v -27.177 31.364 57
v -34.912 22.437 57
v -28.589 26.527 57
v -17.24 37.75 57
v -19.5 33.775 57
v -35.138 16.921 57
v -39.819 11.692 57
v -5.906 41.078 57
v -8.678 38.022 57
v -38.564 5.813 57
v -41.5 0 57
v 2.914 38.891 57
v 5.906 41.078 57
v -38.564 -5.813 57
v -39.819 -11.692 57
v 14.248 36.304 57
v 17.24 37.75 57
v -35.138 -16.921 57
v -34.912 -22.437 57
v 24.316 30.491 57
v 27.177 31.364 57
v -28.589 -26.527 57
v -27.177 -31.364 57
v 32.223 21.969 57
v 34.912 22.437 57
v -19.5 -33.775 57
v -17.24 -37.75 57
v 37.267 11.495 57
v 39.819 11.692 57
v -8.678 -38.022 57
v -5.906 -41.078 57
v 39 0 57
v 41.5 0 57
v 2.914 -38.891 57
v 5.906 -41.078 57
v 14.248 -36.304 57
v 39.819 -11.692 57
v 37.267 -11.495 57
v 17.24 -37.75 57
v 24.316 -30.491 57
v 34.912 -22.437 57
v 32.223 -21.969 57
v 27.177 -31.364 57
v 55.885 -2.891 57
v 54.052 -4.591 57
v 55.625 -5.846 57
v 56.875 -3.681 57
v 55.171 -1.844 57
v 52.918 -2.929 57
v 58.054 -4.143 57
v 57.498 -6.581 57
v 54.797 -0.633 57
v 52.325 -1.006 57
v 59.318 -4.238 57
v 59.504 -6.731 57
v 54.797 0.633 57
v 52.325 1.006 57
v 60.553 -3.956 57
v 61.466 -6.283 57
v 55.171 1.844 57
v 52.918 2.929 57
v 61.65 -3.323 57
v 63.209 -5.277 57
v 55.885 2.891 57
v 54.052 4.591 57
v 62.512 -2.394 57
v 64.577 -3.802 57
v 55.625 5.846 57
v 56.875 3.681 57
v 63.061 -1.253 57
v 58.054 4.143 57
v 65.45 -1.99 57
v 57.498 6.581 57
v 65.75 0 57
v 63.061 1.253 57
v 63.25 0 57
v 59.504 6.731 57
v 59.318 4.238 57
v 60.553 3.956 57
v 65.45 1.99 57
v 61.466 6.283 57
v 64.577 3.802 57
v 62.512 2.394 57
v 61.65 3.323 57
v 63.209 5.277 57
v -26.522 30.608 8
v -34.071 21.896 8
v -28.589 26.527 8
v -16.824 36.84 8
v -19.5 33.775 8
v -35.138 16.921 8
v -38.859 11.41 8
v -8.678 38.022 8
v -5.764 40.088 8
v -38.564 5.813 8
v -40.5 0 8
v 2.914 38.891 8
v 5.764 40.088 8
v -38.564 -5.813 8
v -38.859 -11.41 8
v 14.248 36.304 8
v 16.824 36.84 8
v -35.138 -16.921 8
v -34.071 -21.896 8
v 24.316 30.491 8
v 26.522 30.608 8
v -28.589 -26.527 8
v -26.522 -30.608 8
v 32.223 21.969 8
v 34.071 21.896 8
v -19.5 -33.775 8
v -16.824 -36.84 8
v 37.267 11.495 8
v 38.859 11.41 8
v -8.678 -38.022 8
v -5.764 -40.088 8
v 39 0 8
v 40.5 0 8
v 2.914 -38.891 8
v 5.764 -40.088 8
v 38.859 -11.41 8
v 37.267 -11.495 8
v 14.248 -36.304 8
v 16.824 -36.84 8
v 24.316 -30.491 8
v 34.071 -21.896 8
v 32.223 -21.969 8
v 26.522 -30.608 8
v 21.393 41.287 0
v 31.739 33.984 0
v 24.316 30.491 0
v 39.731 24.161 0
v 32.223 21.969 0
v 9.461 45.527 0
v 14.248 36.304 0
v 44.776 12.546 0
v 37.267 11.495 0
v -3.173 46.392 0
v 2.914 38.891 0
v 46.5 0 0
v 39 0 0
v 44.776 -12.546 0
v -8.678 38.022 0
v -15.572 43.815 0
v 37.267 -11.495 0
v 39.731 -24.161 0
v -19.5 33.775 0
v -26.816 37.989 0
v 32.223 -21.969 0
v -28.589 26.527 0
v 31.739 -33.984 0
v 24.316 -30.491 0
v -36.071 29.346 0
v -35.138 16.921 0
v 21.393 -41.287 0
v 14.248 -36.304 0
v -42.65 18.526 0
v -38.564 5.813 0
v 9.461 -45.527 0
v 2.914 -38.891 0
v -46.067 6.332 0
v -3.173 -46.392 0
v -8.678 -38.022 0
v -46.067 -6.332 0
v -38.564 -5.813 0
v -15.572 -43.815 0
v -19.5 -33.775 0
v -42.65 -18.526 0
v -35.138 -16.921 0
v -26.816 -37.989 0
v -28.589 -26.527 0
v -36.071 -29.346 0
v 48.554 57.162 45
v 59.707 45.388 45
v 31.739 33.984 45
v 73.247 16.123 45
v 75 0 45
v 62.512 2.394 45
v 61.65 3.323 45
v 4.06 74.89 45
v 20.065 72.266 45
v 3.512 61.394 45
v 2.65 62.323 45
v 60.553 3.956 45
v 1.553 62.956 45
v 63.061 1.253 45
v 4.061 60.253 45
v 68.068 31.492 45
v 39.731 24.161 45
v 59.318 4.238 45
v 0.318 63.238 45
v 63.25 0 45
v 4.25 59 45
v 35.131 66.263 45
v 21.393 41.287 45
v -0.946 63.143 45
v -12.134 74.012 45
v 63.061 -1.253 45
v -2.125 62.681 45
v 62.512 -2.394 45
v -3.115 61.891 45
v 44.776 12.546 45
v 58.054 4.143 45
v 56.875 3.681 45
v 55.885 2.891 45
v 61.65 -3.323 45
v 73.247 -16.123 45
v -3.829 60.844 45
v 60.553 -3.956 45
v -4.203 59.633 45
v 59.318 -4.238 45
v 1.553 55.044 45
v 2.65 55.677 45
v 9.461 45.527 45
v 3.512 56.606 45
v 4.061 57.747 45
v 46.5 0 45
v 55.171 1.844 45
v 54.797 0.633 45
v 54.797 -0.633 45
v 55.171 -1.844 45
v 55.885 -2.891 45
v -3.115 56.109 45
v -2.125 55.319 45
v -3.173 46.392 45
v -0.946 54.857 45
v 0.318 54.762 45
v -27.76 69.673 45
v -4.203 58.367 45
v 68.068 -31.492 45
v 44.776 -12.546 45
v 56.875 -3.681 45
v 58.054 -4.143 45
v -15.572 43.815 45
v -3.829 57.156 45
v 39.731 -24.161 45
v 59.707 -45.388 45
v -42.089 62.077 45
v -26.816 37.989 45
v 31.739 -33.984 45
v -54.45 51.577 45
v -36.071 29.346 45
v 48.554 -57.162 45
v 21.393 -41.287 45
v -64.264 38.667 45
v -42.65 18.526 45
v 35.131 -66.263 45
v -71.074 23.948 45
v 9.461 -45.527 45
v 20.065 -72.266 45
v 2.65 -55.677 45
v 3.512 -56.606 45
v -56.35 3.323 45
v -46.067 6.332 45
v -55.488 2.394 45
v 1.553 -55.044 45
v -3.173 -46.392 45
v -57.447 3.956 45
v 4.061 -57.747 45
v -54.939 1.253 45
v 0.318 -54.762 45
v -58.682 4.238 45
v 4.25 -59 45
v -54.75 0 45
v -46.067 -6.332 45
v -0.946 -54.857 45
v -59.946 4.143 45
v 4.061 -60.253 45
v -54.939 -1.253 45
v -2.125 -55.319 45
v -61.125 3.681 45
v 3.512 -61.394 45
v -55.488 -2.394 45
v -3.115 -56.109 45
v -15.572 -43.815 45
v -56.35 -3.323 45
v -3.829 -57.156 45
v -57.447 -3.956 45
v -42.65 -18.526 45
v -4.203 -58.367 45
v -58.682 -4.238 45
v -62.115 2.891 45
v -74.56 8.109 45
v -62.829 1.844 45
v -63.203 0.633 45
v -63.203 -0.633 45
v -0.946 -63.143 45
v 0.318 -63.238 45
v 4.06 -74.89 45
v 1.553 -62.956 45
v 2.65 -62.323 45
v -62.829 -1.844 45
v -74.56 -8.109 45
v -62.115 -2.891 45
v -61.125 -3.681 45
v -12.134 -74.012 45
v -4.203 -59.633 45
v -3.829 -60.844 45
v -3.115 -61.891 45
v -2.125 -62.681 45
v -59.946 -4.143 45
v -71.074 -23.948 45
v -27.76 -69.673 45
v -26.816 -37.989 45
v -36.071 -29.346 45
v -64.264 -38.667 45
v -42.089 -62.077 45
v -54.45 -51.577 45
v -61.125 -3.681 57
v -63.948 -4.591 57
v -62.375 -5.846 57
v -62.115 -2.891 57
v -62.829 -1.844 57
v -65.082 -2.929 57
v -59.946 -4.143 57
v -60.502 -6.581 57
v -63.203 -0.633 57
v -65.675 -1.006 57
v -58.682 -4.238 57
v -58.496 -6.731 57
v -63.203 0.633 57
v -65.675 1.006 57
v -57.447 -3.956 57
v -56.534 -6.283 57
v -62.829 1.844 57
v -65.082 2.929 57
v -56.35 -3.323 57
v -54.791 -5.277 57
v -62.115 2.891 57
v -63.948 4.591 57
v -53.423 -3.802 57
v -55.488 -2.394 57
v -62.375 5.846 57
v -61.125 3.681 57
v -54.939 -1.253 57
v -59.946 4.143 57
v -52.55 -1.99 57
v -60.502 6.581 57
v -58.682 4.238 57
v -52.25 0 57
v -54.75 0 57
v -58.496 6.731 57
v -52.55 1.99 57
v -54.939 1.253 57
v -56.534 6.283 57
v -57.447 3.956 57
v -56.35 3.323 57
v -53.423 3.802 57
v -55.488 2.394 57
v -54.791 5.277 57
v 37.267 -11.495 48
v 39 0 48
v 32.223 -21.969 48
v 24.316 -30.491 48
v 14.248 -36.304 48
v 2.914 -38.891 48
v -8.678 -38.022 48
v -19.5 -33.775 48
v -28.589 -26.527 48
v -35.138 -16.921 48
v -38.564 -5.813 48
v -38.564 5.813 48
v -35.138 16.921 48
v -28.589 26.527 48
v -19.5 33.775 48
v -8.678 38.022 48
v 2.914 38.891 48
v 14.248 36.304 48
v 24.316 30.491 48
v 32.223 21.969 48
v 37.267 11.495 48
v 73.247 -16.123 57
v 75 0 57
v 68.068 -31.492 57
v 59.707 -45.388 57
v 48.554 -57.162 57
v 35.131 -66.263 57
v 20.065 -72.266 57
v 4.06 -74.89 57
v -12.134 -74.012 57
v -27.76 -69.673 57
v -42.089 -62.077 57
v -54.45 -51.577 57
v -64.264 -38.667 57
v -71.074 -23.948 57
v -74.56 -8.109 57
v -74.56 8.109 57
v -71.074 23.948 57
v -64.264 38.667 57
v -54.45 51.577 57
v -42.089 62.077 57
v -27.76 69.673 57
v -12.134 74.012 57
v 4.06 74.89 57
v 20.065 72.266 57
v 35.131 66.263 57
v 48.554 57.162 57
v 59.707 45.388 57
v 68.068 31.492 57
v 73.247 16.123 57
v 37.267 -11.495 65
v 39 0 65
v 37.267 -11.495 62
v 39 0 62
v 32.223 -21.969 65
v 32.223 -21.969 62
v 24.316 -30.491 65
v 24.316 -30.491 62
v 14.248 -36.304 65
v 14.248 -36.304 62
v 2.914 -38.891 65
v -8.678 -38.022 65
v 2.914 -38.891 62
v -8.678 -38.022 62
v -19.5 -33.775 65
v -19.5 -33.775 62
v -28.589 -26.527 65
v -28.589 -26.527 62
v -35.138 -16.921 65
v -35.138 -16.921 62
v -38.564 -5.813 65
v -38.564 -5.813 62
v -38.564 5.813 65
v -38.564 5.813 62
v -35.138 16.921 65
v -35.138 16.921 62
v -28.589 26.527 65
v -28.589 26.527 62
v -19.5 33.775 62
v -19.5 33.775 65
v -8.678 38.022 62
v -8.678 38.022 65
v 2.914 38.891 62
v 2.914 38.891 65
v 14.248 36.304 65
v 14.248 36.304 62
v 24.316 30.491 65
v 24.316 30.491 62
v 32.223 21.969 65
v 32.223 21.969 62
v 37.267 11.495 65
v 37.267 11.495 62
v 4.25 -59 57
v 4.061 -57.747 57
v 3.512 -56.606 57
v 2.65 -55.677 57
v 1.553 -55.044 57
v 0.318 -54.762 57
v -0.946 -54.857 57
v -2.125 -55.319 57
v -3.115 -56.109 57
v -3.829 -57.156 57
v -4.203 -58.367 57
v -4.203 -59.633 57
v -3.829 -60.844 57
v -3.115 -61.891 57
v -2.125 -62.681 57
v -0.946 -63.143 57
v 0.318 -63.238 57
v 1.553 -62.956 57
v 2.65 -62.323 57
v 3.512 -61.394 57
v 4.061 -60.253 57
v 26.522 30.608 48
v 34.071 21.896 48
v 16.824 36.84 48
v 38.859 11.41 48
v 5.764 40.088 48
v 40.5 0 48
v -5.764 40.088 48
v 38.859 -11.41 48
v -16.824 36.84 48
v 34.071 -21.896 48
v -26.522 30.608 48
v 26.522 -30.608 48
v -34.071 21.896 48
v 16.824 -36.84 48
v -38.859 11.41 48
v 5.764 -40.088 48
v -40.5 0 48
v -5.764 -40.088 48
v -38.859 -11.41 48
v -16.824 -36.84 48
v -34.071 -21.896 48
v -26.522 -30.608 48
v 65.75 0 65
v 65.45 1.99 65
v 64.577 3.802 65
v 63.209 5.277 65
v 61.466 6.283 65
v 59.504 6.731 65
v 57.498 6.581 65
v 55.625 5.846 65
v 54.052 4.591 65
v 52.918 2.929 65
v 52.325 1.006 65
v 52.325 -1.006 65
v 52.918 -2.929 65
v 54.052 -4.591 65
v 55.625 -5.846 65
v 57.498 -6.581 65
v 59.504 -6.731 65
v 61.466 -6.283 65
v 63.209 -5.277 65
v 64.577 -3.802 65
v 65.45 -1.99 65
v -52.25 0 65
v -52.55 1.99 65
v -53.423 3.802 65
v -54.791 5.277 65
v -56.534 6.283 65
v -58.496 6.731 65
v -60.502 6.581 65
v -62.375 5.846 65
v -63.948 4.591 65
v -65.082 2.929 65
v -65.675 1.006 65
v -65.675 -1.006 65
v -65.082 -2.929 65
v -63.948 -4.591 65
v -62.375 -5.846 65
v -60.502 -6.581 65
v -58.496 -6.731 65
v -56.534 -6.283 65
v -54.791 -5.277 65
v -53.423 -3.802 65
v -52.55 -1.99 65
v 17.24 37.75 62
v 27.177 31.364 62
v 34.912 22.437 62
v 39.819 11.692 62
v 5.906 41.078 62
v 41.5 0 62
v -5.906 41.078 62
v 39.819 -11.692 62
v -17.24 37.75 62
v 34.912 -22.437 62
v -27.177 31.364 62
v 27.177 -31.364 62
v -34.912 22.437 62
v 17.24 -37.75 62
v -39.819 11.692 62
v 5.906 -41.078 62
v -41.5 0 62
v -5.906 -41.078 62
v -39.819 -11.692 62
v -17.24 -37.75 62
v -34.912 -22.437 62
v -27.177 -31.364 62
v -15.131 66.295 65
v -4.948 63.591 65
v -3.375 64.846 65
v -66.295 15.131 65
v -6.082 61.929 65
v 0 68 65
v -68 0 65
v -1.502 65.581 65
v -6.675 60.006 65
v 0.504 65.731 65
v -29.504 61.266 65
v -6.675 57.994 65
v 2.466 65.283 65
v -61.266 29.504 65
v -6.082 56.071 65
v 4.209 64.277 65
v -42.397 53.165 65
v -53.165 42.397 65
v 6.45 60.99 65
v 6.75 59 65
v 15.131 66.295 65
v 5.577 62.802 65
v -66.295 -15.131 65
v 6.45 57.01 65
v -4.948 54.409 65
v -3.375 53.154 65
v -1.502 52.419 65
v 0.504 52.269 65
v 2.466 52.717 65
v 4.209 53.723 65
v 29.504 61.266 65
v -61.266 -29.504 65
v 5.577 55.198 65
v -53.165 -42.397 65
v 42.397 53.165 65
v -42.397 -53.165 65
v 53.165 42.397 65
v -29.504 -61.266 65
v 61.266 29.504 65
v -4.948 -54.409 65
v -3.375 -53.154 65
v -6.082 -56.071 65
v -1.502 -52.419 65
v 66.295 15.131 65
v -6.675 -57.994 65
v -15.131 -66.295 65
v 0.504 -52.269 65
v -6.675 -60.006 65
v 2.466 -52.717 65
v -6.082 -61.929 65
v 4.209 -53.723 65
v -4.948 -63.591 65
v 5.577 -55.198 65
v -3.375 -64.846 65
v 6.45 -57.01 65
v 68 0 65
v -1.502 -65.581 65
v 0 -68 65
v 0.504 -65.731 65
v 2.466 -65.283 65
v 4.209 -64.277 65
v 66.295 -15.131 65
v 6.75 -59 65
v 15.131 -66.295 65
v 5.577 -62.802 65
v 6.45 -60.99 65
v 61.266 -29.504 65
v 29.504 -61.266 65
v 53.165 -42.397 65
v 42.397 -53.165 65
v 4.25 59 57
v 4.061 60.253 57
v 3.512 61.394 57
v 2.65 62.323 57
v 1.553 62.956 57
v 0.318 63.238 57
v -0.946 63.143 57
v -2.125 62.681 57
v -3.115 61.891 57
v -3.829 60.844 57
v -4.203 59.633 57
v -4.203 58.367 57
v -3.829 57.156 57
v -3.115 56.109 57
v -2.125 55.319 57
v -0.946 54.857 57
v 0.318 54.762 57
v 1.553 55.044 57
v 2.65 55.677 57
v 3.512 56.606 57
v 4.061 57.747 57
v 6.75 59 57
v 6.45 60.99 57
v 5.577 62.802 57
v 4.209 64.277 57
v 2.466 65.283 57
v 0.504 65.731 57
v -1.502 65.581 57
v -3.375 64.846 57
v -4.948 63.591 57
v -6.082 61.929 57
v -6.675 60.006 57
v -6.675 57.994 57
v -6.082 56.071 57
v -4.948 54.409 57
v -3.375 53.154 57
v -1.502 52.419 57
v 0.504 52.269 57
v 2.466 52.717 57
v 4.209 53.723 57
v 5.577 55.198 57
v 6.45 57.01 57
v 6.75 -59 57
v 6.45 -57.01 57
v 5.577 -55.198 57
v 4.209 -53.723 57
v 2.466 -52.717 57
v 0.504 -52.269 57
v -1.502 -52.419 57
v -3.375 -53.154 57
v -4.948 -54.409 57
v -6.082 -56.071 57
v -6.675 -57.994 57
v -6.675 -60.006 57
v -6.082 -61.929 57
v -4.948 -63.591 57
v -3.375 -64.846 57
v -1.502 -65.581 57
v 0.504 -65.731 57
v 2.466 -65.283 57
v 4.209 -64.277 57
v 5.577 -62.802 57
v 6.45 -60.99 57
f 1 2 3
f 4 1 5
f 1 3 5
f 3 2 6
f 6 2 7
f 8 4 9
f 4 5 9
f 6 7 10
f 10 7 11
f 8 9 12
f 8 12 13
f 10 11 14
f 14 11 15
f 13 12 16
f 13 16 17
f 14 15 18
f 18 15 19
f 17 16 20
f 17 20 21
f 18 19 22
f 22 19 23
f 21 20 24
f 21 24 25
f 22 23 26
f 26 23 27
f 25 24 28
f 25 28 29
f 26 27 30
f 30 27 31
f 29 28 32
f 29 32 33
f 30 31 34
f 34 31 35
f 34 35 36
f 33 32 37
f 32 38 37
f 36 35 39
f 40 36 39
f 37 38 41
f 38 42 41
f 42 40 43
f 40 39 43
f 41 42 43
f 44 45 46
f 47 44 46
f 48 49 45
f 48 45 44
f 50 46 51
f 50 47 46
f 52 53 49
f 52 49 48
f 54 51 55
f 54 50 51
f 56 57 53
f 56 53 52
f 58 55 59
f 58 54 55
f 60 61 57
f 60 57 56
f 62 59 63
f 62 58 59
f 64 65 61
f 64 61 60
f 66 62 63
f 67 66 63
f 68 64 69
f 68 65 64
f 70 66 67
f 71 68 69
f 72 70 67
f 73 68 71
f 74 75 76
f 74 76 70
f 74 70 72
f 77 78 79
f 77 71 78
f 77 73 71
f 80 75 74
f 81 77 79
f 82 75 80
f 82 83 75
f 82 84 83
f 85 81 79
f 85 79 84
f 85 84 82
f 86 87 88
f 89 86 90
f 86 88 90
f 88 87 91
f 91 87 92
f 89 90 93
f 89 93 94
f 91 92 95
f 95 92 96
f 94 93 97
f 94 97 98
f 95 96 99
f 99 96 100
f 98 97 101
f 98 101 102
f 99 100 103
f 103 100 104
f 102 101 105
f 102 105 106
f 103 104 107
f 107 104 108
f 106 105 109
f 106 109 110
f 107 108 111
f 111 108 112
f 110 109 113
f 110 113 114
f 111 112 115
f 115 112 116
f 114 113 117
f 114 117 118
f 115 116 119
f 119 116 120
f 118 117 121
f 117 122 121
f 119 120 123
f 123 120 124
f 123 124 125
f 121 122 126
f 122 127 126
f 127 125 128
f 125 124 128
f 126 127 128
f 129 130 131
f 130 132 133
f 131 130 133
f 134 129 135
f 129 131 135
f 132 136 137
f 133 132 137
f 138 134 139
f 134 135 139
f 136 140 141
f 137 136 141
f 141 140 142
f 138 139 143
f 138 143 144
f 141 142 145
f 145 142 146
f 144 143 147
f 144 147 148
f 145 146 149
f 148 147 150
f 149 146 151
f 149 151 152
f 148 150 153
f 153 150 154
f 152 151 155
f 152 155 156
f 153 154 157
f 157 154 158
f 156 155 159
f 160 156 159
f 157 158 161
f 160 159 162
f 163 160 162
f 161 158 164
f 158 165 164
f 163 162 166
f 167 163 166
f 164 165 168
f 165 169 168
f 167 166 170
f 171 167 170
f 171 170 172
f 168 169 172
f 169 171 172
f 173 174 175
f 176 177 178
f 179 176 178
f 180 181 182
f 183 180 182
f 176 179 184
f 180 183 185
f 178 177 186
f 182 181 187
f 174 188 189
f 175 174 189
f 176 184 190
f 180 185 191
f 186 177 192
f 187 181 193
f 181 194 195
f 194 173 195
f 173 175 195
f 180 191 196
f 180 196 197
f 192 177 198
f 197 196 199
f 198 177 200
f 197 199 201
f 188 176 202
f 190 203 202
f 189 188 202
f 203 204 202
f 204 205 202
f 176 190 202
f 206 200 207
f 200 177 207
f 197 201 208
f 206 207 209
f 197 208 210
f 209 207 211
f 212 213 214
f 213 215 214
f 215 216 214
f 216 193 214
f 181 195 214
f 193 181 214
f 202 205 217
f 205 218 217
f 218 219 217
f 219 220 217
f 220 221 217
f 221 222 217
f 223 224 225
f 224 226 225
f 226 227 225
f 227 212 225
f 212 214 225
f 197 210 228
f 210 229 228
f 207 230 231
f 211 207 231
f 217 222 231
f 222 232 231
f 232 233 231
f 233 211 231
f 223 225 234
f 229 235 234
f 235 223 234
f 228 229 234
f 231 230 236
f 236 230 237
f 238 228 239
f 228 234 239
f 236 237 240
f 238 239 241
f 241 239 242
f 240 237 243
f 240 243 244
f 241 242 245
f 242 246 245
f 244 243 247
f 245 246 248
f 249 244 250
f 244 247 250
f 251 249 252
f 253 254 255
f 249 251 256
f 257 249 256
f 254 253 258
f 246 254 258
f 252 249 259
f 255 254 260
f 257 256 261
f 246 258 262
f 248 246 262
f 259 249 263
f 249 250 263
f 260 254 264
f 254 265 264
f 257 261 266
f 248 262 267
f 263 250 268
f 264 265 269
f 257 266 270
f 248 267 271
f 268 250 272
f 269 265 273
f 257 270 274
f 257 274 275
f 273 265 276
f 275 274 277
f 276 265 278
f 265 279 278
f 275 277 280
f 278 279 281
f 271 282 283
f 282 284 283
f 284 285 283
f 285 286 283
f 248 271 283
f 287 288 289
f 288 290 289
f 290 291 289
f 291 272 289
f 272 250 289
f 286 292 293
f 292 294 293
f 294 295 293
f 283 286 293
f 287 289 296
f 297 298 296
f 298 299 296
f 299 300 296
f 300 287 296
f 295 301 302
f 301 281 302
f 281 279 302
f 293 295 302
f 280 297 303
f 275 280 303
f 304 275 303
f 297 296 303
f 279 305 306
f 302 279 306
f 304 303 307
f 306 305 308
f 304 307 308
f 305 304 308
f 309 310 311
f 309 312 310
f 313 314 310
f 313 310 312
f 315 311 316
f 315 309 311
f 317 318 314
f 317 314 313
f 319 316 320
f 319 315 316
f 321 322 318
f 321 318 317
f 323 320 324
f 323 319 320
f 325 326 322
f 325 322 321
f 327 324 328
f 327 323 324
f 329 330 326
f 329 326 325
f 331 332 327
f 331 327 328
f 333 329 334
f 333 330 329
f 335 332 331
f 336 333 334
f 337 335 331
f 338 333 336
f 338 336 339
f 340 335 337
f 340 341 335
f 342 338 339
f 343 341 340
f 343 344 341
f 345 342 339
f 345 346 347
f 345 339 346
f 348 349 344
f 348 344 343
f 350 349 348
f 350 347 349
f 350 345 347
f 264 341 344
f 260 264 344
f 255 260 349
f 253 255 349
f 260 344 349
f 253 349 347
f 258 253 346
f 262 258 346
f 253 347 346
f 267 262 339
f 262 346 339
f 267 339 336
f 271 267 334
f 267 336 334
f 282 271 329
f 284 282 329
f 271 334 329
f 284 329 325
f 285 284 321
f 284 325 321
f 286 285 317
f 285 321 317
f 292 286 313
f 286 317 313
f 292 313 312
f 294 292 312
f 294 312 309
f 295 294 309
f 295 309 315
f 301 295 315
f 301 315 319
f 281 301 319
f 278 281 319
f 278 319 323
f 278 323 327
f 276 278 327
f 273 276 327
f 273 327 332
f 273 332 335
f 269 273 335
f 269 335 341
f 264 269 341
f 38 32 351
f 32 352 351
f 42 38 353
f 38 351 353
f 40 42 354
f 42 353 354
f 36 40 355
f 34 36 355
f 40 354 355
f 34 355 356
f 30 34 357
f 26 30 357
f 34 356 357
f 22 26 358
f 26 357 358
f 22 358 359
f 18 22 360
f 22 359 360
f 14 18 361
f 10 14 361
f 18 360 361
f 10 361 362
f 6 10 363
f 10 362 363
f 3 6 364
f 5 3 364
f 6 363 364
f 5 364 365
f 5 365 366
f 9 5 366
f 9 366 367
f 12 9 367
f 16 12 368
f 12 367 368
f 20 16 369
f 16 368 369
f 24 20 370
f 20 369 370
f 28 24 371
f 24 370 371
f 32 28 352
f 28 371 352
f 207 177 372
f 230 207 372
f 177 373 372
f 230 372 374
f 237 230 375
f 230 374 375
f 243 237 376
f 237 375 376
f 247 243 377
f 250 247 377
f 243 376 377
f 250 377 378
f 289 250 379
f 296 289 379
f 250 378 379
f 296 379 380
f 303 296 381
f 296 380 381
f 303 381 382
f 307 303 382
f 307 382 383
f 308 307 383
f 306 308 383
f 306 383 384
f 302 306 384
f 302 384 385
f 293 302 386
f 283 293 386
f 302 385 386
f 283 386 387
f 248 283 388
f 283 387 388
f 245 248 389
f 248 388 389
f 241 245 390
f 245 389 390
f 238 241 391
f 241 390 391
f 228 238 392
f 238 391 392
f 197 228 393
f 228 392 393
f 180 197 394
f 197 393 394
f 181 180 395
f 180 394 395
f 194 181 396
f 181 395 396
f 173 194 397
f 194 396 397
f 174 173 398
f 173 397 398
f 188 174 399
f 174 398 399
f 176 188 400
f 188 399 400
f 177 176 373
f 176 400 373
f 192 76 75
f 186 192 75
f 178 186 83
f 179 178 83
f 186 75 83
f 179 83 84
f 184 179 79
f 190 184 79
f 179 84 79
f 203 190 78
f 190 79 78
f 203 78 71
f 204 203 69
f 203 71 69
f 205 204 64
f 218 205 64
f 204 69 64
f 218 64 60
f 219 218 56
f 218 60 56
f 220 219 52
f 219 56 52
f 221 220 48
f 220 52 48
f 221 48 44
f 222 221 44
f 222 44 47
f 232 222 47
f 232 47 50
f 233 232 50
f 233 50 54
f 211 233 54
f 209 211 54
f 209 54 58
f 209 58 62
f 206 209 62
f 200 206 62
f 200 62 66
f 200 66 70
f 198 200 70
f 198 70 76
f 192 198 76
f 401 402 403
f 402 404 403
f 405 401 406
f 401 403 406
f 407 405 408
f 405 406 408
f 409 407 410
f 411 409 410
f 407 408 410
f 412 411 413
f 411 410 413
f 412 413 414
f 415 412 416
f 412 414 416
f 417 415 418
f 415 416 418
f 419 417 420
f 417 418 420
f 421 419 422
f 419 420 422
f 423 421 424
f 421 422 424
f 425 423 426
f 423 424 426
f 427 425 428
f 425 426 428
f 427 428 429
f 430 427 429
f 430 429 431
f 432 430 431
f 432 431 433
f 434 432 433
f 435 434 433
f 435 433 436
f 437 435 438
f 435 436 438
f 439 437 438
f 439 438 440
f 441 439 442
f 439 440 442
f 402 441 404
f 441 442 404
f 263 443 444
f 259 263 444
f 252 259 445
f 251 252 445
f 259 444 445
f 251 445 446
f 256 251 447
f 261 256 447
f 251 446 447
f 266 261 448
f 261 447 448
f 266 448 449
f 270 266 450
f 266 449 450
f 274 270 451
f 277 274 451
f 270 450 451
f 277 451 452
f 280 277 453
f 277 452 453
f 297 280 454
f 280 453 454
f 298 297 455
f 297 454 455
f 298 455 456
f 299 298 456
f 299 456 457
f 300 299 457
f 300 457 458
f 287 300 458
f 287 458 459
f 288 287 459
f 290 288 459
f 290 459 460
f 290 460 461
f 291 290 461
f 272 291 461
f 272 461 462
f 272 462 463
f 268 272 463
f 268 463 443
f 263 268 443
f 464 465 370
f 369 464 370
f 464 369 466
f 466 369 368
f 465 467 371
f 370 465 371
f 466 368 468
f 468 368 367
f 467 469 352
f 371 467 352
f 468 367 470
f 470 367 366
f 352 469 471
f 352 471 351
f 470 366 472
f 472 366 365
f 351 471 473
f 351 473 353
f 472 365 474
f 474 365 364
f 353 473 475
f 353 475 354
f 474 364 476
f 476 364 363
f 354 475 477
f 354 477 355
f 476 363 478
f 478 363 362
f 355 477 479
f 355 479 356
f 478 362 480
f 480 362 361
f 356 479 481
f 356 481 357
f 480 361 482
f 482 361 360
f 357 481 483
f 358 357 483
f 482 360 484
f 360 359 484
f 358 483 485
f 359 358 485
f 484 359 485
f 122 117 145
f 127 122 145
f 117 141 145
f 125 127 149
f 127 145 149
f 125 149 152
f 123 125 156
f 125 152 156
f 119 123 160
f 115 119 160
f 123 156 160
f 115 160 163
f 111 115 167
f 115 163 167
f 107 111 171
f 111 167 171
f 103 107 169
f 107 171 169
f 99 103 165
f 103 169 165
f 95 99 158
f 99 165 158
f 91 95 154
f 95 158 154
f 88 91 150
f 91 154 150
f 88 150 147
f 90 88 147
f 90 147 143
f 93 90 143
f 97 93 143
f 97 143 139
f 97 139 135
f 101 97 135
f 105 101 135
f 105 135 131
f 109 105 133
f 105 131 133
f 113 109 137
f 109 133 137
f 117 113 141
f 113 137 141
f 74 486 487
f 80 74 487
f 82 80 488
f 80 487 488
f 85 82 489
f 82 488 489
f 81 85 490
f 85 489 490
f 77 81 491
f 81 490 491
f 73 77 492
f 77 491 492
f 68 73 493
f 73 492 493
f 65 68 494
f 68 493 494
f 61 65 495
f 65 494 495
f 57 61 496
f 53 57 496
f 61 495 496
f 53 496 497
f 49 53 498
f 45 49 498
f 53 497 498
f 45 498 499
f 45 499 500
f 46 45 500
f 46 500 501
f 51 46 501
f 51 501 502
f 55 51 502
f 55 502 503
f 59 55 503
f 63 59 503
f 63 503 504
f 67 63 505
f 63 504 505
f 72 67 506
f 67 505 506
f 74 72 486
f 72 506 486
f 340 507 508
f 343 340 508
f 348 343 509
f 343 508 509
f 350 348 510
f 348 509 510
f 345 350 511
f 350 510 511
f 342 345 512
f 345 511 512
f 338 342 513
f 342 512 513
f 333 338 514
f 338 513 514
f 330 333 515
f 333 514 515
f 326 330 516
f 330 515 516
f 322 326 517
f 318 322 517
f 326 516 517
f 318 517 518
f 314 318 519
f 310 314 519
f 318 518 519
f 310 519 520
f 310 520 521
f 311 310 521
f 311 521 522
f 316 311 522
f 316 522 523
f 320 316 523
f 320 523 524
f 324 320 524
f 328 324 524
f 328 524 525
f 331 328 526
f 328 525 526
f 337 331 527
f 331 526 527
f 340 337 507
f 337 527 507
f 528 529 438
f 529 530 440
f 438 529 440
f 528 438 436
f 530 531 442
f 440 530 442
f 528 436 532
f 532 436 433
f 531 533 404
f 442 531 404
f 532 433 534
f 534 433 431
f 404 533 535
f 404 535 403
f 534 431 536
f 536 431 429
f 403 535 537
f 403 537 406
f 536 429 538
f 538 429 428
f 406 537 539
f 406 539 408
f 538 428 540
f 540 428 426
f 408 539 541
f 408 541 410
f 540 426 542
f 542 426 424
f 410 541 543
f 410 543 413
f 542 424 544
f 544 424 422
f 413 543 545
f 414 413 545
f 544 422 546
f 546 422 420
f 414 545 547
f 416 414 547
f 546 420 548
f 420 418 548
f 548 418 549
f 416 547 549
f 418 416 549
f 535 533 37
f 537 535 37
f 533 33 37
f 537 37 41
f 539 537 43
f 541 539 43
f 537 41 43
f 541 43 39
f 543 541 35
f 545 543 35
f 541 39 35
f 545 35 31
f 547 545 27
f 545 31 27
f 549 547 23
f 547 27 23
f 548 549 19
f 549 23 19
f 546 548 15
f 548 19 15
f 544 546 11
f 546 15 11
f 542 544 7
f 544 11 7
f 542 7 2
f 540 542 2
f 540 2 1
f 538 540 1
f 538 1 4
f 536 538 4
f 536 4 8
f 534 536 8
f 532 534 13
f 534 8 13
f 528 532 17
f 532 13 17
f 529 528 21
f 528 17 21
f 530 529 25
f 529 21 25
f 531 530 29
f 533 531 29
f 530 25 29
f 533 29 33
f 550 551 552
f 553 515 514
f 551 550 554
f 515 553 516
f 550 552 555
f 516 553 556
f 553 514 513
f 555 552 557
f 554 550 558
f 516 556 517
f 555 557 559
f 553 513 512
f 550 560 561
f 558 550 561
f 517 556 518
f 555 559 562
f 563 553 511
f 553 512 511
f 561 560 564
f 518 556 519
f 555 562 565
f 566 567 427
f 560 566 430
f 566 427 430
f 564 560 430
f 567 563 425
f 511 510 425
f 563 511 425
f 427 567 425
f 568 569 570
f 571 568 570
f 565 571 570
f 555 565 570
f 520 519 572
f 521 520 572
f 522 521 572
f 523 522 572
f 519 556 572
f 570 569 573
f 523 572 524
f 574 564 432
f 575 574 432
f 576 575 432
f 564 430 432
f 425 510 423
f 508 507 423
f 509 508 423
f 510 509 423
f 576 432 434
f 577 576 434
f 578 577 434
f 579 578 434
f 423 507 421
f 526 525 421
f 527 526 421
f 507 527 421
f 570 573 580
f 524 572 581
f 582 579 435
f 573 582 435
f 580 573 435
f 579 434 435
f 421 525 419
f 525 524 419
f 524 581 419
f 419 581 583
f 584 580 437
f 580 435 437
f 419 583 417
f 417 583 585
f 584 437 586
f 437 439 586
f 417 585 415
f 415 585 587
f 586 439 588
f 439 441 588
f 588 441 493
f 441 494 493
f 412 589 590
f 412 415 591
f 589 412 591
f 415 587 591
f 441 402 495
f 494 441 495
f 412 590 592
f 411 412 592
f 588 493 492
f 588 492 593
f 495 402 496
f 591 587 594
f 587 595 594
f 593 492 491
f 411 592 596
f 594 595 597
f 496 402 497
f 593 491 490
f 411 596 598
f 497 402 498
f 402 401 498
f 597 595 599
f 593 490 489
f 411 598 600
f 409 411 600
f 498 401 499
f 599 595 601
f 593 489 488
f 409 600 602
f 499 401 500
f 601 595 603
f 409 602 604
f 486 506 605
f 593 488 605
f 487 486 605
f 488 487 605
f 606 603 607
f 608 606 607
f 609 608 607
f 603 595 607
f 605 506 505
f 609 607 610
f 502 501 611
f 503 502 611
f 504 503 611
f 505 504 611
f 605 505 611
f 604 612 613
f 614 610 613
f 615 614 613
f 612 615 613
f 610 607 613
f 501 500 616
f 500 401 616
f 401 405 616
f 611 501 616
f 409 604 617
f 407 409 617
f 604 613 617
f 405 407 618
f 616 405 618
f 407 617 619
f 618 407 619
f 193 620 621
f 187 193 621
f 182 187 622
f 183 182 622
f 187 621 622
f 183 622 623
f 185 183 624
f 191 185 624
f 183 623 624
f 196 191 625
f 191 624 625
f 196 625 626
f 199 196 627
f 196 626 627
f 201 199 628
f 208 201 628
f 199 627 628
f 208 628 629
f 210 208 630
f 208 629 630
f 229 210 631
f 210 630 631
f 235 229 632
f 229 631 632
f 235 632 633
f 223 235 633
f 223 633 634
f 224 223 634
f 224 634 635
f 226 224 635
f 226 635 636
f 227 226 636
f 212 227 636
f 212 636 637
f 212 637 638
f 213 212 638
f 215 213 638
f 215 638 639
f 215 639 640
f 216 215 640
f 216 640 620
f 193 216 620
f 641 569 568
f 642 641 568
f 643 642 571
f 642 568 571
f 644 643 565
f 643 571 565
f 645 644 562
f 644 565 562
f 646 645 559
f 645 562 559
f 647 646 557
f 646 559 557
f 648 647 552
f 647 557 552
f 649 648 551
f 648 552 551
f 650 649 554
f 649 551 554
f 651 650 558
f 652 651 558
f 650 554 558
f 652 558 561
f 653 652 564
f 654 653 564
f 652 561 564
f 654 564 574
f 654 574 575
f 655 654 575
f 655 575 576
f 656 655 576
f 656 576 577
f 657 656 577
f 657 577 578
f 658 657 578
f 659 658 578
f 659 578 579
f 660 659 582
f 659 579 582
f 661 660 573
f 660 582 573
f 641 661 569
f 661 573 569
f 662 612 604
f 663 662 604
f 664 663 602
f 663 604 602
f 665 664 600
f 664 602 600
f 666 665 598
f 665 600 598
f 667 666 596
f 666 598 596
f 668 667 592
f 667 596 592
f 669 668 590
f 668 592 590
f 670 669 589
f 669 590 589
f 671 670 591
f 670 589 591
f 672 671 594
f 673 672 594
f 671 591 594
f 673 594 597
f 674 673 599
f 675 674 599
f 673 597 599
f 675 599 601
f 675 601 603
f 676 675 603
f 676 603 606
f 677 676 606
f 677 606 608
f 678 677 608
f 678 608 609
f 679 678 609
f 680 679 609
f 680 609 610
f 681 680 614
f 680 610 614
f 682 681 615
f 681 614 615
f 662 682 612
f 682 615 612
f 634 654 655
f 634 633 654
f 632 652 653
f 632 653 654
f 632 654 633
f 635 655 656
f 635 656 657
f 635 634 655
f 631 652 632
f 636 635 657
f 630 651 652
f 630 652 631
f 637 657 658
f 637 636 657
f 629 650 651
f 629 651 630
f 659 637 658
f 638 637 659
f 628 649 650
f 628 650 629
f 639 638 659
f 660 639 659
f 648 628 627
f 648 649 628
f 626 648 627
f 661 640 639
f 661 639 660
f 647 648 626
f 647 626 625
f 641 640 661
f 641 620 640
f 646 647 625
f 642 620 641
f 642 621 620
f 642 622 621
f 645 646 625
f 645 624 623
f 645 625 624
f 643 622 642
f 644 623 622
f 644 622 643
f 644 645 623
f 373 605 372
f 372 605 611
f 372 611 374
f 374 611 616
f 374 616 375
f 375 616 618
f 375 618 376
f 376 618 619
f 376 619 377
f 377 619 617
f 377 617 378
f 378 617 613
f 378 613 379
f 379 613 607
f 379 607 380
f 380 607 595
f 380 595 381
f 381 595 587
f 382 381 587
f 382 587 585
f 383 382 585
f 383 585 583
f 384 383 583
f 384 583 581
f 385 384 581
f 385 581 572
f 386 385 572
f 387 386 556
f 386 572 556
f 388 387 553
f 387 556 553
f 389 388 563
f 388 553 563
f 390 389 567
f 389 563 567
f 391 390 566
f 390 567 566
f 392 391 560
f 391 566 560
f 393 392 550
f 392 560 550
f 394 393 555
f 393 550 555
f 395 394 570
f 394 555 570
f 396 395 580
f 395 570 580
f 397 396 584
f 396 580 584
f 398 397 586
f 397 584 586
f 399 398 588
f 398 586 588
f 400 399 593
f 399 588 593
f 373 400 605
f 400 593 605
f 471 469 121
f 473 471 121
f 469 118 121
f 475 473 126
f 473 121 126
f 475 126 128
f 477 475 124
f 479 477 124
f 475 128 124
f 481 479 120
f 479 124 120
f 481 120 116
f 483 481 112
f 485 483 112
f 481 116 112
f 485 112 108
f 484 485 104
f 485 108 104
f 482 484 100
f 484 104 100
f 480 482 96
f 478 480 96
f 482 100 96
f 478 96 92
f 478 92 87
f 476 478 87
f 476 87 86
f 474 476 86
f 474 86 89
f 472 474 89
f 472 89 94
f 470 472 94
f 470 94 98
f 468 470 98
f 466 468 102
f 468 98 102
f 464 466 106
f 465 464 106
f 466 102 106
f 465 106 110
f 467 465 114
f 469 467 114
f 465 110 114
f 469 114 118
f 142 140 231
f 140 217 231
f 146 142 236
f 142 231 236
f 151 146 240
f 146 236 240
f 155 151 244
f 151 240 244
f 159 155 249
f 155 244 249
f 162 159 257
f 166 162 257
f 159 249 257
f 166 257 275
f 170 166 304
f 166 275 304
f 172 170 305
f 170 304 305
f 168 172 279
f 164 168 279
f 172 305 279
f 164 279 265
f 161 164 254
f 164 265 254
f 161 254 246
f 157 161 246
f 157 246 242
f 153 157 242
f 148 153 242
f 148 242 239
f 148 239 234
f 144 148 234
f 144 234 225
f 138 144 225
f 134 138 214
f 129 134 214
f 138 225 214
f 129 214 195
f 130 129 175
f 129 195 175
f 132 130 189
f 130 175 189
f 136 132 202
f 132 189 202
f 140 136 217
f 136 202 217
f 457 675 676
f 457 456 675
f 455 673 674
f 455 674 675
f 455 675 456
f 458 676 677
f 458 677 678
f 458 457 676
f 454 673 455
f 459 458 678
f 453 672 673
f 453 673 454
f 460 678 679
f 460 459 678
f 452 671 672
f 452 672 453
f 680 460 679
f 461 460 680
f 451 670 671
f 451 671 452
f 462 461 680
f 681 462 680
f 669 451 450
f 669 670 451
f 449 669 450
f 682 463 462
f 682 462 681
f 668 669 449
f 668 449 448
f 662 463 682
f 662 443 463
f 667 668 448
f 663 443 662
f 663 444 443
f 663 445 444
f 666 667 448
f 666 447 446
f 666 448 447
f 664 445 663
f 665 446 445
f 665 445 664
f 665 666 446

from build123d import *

# Parameters (mm, degrees)
F4_R     = 4.25
F5_DEPTH = 25
F4_R_2   = 6.75
F6_DEPTH = 8
F7_DEPTH = 8
F8_DEPTH = 8


with BuildPart() as f1:
    # F0 (on Front) → F1 (revolve)
    with BuildSketch(Plane.XZ):
        Polygon((75, 57), (68, 65), (39, 65), (39, 62), (41.5, 62), (41.5, 57), (39, 57), (39, 48), (40.5, 48), (40.5, 8), (39, 8), (39, 0), (46.5, 0), (46.5, 45), (75, 45), align=None)
    revolve(axis=Axis((0, 0, 14.0173053369), (0, 0, -1)))

    # F4 (on offset) → F5 (cut)
    with BuildSketch(Plane.XY.offset(65)):
        with Locations((0, 59)):
            Circle(F4_R)
        with Locations((-59, 0)):
            Circle(F4_R)
        with Locations((0, -59)):
            Circle(F4_R)
        with Locations((59, 0)):
            Circle(F4_R)
    extrude(amount=-F5_DEPTH, mode=Mode.SUBTRACT)

    # F4 (on offset) → F6 (cut)
    with BuildSketch(Plane.XY.offset(65)):
        with Locations((0, 59)):
            Circle(F4_R_2)
        with Locations((0, 59)):
            Circle(F4_R, mode=Mode.SUBTRACT)
    extrude(amount=-F6_DEPTH, mode=Mode.SUBTRACT)

    # F4 (on offset) → F7 (cut)
    with BuildSketch(Plane.XY.offset(65)):
        with Locations((-59, 0)):
            Circle(F4_R_2)
        with Locations((-59, 0)):
            Circle(F4_R, mode=Mode.SUBTRACT)
        with Locations((59, 0)):
            Circle(F4_R_2)
        with Locations((59, 0)):
            Circle(F4_R, mode=Mode.SUBTRACT)
        with Locations((0, -59)):
            Circle(F4_R_2)
        with Locations((0, -59)):
            Circle(F4_R, mode=Mode.SUBTRACT)
    extrude(amount=-F7_DEPTH, mode=Mode.SUBTRACT)

    # F4 (on offset) → F8 (cut)
    with BuildSketch(Plane.XY.offset(65)):
        with Locations((0, -59)):
            Circle(F4_R_2)
        with Locations((0, -59)):
            Circle(F4_R, mode=Mode.SUBTRACT)
    extrude(amount=-F8_DEPTH, mode=Mode.SUBTRACT)


solid = f1.part
